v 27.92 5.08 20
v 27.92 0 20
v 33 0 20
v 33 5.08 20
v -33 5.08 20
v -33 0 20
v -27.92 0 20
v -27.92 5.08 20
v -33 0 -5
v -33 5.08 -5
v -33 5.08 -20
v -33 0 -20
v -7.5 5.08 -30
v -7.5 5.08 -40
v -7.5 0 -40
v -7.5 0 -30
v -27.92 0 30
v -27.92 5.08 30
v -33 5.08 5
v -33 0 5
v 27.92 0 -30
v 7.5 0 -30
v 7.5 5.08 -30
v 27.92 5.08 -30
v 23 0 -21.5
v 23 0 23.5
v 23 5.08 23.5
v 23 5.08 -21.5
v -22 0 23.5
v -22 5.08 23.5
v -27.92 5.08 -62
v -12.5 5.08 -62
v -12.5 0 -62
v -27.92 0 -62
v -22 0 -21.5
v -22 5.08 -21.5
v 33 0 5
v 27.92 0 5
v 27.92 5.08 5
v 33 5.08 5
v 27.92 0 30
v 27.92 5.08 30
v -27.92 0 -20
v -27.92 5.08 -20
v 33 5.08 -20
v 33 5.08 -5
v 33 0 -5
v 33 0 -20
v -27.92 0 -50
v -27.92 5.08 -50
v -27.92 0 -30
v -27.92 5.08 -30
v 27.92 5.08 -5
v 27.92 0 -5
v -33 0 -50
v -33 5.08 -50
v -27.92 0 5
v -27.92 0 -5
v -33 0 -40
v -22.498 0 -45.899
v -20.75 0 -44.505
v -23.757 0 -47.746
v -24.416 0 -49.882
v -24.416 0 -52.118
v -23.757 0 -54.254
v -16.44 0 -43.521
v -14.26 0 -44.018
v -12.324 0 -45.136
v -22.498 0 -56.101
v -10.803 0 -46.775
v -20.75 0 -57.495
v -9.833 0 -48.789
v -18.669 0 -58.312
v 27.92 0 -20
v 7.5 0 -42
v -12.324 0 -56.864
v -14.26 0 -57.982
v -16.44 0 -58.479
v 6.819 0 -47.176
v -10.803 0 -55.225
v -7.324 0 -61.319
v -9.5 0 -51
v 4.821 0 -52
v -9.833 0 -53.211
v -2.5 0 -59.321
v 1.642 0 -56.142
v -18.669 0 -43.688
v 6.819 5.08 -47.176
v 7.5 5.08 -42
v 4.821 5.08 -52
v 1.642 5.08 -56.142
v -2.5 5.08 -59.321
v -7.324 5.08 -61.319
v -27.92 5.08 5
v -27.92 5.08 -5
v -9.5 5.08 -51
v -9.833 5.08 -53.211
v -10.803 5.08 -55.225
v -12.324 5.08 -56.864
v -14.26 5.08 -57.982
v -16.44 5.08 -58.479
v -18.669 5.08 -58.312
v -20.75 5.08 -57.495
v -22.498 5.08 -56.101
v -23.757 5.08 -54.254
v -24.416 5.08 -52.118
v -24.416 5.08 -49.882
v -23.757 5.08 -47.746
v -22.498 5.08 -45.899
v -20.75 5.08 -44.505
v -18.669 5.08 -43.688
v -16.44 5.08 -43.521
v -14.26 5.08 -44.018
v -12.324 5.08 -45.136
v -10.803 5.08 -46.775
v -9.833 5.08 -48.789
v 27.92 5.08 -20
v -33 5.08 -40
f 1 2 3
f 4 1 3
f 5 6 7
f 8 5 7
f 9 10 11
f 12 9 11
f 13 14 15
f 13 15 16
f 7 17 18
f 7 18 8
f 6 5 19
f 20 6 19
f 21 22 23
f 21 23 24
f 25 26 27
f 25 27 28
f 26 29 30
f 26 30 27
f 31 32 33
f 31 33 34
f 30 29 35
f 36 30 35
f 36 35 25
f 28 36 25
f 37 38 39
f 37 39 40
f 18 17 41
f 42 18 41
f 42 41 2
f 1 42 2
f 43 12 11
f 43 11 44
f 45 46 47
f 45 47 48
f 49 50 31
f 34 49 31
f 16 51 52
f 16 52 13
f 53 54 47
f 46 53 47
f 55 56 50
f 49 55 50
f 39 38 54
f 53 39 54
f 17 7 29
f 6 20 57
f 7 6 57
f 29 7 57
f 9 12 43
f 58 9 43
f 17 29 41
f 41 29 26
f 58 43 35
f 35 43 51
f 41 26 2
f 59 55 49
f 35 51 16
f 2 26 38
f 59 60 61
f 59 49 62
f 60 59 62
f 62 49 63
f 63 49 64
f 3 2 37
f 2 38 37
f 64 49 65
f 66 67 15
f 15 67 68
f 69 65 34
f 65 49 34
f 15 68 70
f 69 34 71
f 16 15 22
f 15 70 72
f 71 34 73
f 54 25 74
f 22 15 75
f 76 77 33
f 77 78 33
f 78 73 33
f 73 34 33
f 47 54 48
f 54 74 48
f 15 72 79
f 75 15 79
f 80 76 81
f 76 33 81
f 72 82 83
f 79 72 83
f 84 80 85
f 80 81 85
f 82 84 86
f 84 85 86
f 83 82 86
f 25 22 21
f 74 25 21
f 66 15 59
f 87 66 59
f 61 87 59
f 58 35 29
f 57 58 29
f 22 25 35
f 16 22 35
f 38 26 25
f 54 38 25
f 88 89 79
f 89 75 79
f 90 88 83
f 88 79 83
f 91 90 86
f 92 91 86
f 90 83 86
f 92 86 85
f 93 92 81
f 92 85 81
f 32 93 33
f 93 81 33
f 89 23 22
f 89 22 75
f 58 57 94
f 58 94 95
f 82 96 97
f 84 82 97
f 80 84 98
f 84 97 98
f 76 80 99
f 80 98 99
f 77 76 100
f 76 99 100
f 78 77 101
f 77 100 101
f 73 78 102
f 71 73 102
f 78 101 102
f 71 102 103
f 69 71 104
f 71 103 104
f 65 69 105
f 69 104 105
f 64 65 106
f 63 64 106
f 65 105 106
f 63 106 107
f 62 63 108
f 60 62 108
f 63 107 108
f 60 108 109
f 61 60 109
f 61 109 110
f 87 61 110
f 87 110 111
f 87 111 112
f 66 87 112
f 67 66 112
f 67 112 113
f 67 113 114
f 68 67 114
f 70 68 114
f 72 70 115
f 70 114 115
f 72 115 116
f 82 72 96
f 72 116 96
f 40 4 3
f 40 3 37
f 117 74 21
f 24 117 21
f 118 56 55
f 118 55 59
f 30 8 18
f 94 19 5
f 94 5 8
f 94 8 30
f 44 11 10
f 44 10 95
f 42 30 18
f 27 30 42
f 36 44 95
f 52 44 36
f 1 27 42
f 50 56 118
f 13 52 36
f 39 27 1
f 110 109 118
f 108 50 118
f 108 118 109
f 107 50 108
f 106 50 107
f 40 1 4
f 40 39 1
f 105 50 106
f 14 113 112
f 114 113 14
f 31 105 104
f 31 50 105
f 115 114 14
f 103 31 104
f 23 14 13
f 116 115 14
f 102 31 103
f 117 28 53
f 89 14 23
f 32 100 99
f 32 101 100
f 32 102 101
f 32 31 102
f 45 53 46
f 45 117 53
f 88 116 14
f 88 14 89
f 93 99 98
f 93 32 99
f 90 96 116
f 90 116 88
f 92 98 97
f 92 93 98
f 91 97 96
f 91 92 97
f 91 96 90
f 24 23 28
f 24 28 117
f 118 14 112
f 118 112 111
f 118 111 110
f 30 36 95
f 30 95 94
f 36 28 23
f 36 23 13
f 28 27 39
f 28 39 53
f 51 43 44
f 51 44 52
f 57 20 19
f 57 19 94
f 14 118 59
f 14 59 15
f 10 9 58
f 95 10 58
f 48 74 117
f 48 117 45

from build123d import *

# Parameters (mm, degrees)
SKETCH1_W           = 55.84
SKETCH1_H           = 60
SKETCH1_W_2         = 45
SKETCH1_H_2         = 45
BOSS_EXTRUDE1_DEPTH = 5.08
SKETCH2_W           = 5.08
SKETCH2_H           = 15
BOSS_EXTRUDE2_DEPTH = 5.08
SKETCH3_R           = 7.5
BOSS_EXTRUDE3_DEPTH = 5.08
FILLET1_R           = 20
SKETCH4_W           = 5.08
SKETCH4_H           = 12
CUT_EXTRUDE1_DEPTH  = 6.08


with BuildPart() as part:
    # Sketch1 → Boss-Extrude1 (new body)
    with BuildSketch(Plane(origin=(0, 0, 0), x_dir=(1, 0, 0), z_dir=(0, 1, 0))):
        Rectangle(SKETCH1_W, SKETCH1_H)
        with Locations((0.5, -1)):
            Rectangle(SKETCH1_W_2, SKETCH1_H_2, mode=Mode.SUBTRACT)
    extrude(amount=BOSS_EXTRUDE1_DEPTH)

    # Sketch2 → Boss-Extrude2 (add)
    with BuildSketch(Plane(origin=(0, 5.08, 0), x_dir=(1, 0, 0), z_dir=(0, 1, 0))):
        with Locations((-30.46, -12.5)):
            Rectangle(SKETCH2_W, SKETCH2_H)
        with Locations((30.46, -12.5)):
            Rectangle(SKETCH2_W, SKETCH2_H)
        with Locations((-30.46, 12.5)):
            Rectangle(SKETCH2_W, SKETCH2_H)
        with Locations((30.46, 12.5)):
            Rectangle(SKETCH2_W, SKETCH2_H)
    extrude(amount=-BOSS_EXTRUDE2_DEPTH)

    # Sketch3 → Boss-Extrude3 (add)
    with BuildSketch(Plane(origin=(0, 5.08, 0), x_dir=(1, 0, 0), z_dir=(0, 1, 0))):
        Polygon((-7.5, 30), (7.5, 30), (7.5, 40), (7.5, 62), (-33, 62), (-33, 40), (-7.5, 40), align=None)
        with Locations((-17, 51)):
            Circle(SKETCH3_R, mode=Mode.SUBTRACT)
    extrude(amount=-BOSS_EXTRUDE3_DEPTH)

    # Fillet1
    fillet1_edges = [part.edges().sort_by_distance(p)[0] for p in [
        (7.5, 2.54, -62),
    ]]
    fillet(fillet1_edges, radius=FILLET1_R)

    # Sketch4 → Cut-Extrude1 (cut, through all)
    with BuildSketch(Plane(origin=(0, 5.08, 0), x_dir=(1, 0, 0), z_dir=(0, 1, 0))):
        with Locations((-30.46, 56)):
            Rectangle(SKETCH4_W, SKETCH4_H)
    extrude(amount=-CUT_EXTRUDE1_DEPTH, mode=Mode.SUBTRACT)


solid = part.part
